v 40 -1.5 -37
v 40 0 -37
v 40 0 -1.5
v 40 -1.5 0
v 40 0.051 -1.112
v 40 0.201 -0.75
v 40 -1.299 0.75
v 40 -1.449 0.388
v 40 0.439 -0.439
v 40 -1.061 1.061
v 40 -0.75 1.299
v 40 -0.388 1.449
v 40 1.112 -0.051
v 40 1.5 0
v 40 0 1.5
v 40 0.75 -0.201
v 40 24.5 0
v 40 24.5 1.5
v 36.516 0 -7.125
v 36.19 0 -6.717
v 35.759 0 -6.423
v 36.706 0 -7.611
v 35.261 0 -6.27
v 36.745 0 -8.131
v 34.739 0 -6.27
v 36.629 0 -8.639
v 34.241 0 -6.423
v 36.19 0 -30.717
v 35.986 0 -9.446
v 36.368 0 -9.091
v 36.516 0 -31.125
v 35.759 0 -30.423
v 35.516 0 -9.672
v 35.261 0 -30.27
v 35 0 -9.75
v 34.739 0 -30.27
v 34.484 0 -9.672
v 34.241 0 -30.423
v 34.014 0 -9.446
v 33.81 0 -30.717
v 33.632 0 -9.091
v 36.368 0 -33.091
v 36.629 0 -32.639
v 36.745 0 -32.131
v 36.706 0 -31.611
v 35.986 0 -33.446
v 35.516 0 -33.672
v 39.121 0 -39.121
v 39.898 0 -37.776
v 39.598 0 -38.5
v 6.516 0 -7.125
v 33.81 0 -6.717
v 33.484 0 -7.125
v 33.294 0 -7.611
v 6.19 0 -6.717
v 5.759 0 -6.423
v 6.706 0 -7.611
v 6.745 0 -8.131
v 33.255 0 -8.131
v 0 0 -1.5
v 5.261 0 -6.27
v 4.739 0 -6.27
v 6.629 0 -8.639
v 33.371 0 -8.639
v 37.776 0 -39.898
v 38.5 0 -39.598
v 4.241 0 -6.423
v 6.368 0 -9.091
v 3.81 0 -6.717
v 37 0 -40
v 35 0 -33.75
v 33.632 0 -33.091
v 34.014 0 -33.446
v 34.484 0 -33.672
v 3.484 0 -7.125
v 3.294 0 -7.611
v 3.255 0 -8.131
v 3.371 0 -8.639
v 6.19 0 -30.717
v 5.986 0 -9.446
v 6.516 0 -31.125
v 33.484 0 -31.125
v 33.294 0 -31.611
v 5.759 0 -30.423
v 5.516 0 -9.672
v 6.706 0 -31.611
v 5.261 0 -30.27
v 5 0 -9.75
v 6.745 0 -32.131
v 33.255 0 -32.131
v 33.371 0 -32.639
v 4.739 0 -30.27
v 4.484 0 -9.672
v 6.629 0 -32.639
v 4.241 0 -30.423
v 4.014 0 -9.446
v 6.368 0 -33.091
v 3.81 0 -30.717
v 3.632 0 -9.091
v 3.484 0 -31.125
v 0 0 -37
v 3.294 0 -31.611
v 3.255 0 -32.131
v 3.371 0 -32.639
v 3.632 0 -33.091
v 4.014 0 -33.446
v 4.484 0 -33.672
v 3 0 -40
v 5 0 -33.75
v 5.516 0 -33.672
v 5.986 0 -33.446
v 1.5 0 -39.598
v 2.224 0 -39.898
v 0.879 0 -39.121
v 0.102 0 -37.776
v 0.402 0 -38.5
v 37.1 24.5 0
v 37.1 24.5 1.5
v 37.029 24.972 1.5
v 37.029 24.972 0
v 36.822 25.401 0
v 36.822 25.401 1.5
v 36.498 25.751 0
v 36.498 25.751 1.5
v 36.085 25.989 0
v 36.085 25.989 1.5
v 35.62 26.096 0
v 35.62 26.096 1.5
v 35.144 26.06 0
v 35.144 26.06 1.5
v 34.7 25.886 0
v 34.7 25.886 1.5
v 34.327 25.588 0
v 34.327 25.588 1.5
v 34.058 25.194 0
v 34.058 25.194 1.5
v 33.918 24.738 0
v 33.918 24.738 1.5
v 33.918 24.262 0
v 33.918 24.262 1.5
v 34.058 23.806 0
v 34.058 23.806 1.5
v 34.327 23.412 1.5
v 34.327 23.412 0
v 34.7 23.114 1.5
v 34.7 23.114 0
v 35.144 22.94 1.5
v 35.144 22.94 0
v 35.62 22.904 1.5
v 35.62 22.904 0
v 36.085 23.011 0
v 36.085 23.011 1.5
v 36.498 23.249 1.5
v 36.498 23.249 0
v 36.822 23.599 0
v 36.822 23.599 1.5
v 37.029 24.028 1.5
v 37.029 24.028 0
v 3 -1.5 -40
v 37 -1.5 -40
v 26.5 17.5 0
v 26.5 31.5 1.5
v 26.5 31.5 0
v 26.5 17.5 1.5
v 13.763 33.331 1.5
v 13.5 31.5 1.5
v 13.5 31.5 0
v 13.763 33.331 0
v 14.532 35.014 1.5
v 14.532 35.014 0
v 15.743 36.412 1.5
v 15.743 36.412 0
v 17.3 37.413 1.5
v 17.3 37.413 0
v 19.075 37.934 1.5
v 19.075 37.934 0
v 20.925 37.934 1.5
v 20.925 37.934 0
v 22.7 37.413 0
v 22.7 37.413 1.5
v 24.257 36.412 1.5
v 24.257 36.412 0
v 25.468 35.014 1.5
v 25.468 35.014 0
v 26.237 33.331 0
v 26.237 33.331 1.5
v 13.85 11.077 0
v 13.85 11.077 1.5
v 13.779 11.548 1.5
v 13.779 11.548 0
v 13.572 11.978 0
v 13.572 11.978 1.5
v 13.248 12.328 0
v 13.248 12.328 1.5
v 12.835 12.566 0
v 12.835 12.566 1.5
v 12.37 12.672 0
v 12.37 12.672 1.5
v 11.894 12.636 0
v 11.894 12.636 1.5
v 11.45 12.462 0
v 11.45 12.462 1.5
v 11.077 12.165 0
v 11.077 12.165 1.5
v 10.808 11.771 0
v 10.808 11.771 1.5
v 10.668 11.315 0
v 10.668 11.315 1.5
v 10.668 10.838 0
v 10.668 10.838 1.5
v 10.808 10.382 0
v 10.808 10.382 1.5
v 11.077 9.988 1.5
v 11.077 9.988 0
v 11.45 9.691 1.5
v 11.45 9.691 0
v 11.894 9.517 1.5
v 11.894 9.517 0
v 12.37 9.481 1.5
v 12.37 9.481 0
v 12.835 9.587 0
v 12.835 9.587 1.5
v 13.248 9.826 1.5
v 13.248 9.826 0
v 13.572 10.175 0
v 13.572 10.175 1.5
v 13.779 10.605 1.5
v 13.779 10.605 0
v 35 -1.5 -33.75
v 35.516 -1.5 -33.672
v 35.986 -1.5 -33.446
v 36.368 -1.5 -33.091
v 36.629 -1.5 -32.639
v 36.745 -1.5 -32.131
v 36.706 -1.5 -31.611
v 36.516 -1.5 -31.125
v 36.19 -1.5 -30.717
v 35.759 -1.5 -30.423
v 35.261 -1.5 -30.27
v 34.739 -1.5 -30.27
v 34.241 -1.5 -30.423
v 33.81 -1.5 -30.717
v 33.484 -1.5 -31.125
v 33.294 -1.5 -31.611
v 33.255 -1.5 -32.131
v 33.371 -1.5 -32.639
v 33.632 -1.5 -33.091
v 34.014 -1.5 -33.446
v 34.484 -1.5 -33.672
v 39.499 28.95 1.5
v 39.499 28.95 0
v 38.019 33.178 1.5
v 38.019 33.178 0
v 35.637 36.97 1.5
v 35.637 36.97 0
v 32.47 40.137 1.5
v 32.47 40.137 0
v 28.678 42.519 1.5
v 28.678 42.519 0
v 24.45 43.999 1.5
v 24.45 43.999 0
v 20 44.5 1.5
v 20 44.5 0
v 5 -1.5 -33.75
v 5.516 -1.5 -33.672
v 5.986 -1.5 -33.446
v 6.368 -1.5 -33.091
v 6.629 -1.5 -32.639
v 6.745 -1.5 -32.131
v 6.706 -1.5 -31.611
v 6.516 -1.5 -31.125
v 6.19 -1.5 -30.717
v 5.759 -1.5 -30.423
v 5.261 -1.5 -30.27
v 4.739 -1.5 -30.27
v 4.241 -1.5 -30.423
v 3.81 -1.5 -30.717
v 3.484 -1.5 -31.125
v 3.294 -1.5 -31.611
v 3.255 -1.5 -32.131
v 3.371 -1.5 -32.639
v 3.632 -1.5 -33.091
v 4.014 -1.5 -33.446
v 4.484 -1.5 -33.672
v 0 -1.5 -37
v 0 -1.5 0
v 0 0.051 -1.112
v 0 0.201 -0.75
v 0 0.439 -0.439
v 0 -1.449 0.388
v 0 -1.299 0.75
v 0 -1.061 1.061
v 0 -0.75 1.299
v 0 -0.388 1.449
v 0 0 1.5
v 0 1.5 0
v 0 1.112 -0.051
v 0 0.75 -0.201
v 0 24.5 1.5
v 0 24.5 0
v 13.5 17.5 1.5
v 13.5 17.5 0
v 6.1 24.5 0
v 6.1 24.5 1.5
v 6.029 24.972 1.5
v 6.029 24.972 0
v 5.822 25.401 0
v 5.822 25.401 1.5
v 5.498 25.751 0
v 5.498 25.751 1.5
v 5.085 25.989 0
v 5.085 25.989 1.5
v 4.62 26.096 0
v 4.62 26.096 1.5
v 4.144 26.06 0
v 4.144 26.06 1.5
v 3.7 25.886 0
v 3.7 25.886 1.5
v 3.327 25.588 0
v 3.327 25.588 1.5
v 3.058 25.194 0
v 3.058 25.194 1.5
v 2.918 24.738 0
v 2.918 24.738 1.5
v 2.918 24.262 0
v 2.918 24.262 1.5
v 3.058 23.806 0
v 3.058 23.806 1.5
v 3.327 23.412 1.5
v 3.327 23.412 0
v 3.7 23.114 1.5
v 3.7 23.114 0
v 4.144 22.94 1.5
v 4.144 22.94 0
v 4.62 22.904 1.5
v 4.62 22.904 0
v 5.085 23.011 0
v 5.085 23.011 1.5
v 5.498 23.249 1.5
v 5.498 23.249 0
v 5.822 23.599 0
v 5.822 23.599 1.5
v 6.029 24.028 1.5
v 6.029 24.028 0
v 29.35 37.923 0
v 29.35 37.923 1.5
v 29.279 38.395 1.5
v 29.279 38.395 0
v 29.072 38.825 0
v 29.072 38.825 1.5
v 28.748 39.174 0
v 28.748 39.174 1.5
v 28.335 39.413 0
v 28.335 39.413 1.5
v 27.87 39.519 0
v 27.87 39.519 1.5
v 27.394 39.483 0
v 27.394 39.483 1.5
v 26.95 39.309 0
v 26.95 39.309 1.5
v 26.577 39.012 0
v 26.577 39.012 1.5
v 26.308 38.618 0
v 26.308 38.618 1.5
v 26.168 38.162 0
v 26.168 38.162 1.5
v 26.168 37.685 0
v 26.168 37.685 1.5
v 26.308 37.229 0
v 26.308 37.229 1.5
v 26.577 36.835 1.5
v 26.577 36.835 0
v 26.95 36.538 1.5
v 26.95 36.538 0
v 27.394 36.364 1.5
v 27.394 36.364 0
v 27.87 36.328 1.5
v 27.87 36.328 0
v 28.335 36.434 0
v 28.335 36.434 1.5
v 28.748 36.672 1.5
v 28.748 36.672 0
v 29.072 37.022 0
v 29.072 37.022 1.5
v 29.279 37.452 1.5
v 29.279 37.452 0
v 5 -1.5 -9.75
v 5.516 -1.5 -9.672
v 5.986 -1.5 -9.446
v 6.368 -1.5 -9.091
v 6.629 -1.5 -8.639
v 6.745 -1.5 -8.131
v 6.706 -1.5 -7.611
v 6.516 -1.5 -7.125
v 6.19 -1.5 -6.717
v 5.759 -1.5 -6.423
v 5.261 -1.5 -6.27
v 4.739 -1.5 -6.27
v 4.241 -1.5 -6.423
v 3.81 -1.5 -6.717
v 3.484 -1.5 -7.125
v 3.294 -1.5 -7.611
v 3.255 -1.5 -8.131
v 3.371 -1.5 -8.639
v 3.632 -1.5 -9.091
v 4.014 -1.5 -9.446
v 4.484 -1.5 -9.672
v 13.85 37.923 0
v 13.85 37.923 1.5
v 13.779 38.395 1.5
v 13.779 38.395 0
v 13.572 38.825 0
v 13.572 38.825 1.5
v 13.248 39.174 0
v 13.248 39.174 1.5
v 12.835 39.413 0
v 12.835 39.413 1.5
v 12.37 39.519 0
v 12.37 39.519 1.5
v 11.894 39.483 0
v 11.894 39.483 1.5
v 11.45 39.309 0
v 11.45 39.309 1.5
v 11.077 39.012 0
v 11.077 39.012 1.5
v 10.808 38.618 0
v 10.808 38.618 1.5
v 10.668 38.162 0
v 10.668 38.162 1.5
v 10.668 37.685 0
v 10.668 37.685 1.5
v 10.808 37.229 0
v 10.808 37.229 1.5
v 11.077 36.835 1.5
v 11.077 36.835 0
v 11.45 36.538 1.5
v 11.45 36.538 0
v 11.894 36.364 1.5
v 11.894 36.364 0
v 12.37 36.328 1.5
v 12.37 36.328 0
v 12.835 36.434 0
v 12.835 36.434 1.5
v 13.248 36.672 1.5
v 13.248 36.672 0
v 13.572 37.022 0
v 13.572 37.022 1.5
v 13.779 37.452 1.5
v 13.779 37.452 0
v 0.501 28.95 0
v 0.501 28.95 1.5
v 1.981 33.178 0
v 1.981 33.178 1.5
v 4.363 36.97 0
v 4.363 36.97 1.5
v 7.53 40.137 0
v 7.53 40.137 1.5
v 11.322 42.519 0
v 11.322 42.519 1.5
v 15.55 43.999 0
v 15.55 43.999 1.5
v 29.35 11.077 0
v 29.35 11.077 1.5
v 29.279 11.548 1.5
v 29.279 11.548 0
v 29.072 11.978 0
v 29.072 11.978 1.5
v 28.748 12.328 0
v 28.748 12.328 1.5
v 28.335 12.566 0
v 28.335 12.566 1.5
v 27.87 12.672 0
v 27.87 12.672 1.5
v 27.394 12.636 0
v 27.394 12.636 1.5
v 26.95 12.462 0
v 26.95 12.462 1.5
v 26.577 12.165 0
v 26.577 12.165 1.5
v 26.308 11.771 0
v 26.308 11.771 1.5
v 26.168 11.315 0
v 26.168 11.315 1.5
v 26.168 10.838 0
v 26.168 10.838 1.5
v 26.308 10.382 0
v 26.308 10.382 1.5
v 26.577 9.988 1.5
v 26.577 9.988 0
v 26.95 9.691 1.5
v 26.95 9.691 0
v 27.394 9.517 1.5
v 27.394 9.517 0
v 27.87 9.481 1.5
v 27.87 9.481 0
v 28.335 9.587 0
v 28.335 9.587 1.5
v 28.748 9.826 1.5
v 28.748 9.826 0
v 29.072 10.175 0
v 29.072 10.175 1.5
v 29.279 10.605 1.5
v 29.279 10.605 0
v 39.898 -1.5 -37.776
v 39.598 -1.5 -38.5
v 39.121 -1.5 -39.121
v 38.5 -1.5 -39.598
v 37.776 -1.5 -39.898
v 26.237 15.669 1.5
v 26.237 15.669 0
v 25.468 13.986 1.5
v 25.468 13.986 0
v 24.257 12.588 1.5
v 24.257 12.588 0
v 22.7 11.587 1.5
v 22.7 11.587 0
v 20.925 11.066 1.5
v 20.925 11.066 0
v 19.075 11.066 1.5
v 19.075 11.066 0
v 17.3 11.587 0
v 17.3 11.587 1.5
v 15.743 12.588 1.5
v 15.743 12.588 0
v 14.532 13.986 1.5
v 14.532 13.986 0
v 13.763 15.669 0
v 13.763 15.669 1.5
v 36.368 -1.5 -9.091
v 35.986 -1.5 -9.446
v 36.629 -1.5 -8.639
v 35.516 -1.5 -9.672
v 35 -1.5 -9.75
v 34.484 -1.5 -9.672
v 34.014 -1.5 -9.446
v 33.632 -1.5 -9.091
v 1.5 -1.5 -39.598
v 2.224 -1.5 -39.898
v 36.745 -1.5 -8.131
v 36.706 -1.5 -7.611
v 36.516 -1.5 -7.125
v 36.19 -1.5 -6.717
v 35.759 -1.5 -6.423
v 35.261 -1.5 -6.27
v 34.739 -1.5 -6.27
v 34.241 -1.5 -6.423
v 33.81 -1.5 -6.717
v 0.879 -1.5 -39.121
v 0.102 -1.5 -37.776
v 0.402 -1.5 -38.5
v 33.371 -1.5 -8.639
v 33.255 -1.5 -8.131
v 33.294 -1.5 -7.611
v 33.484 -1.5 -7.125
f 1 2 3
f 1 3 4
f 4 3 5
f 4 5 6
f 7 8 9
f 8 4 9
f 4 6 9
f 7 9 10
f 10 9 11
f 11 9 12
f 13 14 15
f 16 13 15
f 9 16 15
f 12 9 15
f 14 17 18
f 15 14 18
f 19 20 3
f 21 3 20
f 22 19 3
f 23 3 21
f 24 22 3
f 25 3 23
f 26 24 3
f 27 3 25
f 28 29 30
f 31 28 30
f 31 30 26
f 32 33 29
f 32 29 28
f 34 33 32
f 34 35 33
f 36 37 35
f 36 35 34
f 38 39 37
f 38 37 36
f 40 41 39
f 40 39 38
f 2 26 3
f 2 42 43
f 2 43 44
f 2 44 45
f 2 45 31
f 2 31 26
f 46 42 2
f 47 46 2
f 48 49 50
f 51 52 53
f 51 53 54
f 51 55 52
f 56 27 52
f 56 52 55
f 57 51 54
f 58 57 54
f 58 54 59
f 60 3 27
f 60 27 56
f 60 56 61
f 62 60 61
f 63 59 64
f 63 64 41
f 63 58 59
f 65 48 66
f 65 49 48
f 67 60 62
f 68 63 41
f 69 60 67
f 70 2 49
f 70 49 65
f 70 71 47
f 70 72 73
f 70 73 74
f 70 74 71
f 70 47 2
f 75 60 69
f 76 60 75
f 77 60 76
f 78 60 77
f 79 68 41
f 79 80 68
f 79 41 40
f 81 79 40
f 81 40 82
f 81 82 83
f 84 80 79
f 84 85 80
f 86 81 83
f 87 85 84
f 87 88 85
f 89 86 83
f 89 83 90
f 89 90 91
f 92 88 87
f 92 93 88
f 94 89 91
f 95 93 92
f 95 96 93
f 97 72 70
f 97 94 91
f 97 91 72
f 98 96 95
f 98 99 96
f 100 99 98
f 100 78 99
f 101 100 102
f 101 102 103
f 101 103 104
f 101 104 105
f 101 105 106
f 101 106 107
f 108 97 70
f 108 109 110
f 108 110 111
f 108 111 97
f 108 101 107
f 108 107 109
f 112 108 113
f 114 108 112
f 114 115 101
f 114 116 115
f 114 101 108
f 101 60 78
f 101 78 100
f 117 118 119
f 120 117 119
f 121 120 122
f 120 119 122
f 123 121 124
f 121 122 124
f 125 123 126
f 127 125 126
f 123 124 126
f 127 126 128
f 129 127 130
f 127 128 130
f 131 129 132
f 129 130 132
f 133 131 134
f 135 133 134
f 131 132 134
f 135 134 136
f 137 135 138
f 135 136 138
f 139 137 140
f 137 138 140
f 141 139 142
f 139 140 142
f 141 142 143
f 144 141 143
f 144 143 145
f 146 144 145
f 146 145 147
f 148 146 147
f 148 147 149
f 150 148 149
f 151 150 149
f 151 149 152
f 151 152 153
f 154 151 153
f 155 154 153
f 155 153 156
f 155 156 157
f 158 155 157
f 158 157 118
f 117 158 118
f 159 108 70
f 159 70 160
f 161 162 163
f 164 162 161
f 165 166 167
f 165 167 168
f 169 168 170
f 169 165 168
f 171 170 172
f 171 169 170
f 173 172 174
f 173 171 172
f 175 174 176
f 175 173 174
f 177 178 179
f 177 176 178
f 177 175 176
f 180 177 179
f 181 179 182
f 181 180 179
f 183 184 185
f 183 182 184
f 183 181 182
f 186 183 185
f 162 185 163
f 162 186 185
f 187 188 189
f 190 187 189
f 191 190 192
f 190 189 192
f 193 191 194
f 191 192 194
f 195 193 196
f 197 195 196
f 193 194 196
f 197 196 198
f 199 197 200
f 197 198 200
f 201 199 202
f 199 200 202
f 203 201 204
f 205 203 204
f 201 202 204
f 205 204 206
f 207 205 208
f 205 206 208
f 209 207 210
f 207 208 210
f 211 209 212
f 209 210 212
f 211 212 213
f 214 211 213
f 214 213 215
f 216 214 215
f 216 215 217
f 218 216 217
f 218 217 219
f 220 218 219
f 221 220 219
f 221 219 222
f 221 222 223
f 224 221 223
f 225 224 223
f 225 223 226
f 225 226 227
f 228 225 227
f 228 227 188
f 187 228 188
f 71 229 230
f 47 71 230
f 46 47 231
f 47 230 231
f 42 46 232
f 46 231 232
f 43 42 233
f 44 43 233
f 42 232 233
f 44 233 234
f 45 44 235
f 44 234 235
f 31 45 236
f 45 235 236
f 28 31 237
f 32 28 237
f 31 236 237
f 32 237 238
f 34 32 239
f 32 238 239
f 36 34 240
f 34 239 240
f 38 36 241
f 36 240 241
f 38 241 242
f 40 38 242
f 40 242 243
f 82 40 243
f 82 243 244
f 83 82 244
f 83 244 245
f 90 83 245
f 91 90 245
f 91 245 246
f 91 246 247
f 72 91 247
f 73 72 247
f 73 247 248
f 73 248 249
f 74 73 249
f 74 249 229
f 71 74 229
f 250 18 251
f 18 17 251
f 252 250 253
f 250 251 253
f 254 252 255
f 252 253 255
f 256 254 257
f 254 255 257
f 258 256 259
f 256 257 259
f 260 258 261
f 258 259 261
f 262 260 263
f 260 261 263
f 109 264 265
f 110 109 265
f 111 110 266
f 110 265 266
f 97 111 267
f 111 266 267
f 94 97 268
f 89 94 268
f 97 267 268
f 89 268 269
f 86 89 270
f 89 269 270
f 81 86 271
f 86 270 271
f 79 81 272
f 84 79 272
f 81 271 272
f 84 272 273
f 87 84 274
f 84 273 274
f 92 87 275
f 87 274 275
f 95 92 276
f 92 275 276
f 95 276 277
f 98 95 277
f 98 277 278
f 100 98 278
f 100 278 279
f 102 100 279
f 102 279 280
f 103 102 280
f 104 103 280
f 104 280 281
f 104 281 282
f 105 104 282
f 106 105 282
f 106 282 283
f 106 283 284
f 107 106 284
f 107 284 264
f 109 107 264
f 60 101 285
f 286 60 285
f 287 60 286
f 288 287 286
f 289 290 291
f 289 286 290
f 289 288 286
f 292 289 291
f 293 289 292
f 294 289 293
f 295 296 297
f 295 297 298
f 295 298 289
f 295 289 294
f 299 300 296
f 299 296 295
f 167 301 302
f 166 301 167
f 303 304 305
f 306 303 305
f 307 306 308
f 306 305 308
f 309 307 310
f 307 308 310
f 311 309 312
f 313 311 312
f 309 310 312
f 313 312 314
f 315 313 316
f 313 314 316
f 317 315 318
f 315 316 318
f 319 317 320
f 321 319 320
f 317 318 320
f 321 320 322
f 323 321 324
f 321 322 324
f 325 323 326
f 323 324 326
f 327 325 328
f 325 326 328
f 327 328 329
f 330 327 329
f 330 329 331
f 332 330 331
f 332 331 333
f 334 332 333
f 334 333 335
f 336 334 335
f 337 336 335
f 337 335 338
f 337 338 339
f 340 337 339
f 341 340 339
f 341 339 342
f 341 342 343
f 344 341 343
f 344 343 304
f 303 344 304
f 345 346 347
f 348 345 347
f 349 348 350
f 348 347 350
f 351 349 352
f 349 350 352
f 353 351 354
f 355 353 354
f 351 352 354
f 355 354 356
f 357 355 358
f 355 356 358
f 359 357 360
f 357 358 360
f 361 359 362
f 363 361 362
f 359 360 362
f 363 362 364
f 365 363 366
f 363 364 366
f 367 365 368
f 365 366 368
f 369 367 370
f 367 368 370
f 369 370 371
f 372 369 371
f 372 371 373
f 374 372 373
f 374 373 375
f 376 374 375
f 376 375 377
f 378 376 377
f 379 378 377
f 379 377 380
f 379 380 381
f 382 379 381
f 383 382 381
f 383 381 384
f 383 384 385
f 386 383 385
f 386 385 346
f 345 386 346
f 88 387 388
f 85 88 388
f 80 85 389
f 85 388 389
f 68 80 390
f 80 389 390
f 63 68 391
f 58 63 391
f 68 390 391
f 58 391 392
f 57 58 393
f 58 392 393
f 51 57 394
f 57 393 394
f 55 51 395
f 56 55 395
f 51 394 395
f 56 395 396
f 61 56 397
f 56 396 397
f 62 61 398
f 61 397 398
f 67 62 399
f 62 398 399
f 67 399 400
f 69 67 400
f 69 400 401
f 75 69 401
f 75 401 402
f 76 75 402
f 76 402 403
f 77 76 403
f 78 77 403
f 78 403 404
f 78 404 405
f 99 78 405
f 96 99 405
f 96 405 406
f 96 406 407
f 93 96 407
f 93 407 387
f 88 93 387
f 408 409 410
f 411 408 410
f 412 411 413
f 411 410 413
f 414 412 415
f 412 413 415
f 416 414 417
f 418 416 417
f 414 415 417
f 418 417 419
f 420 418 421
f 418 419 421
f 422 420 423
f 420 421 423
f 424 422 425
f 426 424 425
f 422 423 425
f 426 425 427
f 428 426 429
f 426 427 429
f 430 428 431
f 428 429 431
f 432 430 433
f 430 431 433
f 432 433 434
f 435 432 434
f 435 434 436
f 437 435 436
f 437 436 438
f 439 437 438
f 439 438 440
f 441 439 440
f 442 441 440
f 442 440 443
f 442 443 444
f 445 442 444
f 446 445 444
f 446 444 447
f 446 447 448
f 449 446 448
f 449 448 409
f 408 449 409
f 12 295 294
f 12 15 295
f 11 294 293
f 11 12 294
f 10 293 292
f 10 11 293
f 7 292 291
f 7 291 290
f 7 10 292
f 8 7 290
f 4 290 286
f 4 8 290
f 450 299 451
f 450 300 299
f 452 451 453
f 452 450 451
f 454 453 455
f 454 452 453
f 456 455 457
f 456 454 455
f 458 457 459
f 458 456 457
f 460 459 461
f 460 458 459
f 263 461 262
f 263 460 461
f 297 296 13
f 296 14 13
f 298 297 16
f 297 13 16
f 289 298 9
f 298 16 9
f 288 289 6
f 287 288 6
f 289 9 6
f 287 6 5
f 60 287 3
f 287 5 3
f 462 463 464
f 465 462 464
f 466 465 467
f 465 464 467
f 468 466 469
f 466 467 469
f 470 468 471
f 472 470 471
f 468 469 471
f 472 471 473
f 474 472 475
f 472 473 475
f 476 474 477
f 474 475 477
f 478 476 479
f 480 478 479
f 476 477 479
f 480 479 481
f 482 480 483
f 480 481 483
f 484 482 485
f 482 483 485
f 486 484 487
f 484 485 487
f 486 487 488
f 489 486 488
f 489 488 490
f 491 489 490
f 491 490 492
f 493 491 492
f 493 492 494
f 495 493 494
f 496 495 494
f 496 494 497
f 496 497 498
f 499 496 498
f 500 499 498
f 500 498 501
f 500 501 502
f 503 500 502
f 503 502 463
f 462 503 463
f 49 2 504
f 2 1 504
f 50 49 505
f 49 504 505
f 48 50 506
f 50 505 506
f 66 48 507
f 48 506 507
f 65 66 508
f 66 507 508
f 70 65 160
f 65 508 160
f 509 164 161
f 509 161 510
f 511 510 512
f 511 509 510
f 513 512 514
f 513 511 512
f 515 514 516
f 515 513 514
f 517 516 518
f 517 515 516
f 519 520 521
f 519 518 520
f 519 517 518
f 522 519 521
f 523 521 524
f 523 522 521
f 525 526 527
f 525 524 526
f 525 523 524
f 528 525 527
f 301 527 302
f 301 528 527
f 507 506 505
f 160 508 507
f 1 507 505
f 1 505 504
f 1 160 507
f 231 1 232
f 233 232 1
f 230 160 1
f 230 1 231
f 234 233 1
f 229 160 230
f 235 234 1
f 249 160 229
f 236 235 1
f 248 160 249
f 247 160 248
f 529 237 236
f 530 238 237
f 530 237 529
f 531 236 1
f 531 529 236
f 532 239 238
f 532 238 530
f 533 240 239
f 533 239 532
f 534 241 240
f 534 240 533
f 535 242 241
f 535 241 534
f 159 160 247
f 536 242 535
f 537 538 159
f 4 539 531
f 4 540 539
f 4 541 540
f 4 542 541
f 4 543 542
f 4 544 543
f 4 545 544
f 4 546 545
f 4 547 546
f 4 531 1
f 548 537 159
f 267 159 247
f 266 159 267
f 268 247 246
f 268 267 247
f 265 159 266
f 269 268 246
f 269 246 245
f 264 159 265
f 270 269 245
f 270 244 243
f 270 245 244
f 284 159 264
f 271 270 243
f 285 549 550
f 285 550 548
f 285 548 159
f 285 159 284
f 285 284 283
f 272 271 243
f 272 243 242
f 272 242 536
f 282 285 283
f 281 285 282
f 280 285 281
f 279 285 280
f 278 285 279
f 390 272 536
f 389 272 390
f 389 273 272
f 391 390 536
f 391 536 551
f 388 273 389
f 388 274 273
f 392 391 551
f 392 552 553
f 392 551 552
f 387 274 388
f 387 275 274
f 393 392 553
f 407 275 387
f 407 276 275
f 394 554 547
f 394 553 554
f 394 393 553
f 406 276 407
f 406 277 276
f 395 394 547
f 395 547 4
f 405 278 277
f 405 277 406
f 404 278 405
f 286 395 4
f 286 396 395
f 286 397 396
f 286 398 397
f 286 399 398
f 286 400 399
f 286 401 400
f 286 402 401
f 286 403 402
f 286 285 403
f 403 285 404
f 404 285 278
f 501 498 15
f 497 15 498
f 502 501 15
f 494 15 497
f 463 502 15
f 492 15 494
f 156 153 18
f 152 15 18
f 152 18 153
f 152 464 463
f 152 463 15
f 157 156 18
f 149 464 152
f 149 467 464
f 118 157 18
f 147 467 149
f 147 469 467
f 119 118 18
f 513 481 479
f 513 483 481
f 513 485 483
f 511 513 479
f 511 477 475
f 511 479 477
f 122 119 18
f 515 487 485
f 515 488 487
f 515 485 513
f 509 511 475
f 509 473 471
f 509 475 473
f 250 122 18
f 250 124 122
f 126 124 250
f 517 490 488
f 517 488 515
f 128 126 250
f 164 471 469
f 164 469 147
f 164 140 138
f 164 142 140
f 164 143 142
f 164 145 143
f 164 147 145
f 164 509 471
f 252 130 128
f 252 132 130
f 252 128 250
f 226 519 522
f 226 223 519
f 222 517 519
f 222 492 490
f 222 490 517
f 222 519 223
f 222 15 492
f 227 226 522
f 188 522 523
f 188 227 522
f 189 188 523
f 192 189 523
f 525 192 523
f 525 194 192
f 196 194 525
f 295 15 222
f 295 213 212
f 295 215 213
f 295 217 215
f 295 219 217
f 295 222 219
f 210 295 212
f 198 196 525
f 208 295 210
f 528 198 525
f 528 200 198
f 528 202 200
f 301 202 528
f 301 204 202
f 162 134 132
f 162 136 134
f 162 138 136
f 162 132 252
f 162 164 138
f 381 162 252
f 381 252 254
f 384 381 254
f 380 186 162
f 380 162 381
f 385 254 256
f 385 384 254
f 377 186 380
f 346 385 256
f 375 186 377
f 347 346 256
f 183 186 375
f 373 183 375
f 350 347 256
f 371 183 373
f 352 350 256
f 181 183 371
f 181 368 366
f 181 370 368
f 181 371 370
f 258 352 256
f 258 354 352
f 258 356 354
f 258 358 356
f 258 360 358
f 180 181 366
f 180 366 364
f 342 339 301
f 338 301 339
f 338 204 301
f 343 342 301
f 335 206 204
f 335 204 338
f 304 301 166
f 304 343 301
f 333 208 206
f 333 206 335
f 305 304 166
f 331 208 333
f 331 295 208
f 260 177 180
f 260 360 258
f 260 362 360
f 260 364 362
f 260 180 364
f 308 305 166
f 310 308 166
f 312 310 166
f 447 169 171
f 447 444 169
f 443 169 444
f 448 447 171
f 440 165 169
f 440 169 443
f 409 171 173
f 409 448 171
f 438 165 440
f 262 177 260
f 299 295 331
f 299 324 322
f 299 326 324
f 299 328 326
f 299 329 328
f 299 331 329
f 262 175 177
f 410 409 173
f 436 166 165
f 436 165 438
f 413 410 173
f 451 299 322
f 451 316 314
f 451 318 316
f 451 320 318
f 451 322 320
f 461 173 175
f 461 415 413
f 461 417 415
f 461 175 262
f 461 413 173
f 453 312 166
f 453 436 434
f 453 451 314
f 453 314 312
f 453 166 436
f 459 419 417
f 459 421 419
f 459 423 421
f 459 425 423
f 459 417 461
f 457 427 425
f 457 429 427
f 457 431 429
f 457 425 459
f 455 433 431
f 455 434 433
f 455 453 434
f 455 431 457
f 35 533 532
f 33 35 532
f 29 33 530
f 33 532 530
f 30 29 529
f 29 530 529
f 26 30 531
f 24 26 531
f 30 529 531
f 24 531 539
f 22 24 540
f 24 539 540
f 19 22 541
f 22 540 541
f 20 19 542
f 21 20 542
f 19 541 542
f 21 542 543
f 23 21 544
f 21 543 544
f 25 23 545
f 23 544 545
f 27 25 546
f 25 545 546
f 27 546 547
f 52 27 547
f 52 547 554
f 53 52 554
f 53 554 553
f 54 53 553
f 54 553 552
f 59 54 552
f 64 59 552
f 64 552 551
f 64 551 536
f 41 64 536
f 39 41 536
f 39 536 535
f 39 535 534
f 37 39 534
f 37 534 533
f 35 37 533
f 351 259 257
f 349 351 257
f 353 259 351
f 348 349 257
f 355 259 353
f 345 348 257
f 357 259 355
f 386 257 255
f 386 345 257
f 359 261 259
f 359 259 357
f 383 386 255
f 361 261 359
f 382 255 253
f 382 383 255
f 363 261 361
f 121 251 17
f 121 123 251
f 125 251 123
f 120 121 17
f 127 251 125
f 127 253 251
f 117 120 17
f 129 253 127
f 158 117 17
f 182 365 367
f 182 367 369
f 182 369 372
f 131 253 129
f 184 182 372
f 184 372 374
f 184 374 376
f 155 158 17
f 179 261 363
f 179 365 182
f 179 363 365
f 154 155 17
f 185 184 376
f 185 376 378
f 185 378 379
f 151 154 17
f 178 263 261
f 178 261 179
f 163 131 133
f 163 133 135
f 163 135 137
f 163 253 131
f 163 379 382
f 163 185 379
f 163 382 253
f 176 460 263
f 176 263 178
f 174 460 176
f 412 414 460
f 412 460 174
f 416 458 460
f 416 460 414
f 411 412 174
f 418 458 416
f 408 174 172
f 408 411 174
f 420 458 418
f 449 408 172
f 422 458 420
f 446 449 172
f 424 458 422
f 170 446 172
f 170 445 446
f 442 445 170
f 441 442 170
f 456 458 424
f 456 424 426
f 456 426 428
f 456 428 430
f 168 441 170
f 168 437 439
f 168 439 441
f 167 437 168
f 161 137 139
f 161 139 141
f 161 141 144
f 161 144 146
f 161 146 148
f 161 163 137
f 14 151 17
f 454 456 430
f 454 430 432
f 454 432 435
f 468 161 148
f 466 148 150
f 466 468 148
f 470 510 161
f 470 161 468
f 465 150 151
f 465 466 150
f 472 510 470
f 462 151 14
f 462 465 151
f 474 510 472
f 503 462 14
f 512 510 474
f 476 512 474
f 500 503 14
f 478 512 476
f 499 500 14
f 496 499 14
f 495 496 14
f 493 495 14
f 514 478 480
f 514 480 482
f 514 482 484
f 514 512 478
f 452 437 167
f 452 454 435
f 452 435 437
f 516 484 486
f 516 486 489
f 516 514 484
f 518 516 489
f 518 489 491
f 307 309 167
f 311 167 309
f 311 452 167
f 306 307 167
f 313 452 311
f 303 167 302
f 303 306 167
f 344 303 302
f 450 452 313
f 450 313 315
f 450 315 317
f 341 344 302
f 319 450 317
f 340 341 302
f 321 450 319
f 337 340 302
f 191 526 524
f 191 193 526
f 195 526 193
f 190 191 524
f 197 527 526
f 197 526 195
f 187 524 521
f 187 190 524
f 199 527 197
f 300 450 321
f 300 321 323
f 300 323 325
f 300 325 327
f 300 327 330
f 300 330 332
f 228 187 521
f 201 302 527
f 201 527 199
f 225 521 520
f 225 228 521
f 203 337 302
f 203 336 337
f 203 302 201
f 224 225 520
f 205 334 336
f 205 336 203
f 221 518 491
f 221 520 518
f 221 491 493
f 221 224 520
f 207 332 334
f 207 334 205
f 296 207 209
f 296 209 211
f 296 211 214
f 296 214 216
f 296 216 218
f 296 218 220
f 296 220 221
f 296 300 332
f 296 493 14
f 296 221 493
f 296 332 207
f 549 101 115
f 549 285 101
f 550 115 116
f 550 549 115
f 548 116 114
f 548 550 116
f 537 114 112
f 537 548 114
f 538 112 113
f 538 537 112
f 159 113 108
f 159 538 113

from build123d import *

# Parameters (mm, degrees)
BOSS_EXTRUDE1_DEPTH = 40
SKETCH2_R           = 1.75
CUT_EXTRUDE1_DEPTH  = 40
FILLET1_R           = 3
FILLET2_R           = 20
SKETCH3_R           = 1.6
CUT_EXTRUDE2_DEPTH  = 40
FILLET3_R           = 1.5


with BuildPart() as part:
    # Sketch1 → Boss-Extrude1 (new body)
    with BuildSketch(Plane(origin=(0, 0, 0), x_dir=(0, 0, -1), z_dir=(1, 0, 0))):
        Polygon((0, 0), (40, 0), (40, -1.5), (-1.5, -1.5), (-1.5, 44.5), (0, 44.5), align=None)
    extrude(amount=BOSS_EXTRUDE1_DEPTH)

    # Sketch2 → Cut-Extrude1 (cut)
    with BuildSketch(Plane.XZ.offset(1.5)):
        with Locations(Location((5, -32, 0), (0, 0, 270))):
            Circle(SKETCH2_R)
        with Locations(Location((5, -8, 0), (0, 0, 270))):
            Circle(SKETCH2_R)
        with Locations(Location((35, -8, 0), (0, 0, 270))):
            Circle(SKETCH2_R)
        with Locations(Location((35, -32, 0), (0, 0, 270))):
            Circle(SKETCH2_R)
    extrude(amount=-CUT_EXTRUDE1_DEPTH, mode=Mode.SUBTRACT)

    # Fillet1
    fillet1_edges = [part.edges().sort_by_distance(p)[0] for p in [
        (40, -0.75, -40),
        (0, -0.75, -40),
    ]]
    fillet(fillet1_edges, radius=FILLET1_R)

    # Fillet2
    fillet2_edges = [part.edges().sort_by_distance(p)[0] for p in [
        (40, 44.5, 0.75),
        (0, 44.5, 0.75),
    ]]
    fillet(fillet2_edges, radius=FILLET2_R - 0.0001)  # a hair under: the kernel refuses the full size

    # Sketch3 → Cut-Extrude2 (cut)
    with BuildSketch(Plane.XY.offset(1.5)):
        with Locations((4.5, 24.5)):
            Circle(SKETCH3_R)
        with Locations((12.25, 37.923393759)):
            Circle(SKETCH3_R)
        with Locations((27.75, 37.923393759)):
            Circle(SKETCH3_R)
        with Locations((35.5, 24.5)):
            Circle(SKETCH3_R)
        with Locations((27.75, 11.076606241)):
            Circle(SKETCH3_R)
        with Locations((12.25, 11.076606241)):
            Circle(SKETCH3_R)
        with BuildLine():
            Line((26.5, 31.5), (26.5, 17.5))
            ThreePointArc((26.5, 17.5), (20, 11), (13.5, 17.5))
            Line((13.5, 17.5), (13.5, 31.5))
            ThreePointArc((13.5, 31.5), (20, 38), (26.5, 31.5))
        make_face()
    extrude(amount=-CUT_EXTRUDE2_DEPTH, mode=Mode.SUBTRACT)

    # Fillet3
    fillet3_edges = [part.edges().sort_by_distance(p)[0] for p in [
        (20, 0, 0),
        (20, -1.5, 1.5),
    ]]
    fillet(fillet3_edges, radius=FILLET3_R)


solid = part.part
